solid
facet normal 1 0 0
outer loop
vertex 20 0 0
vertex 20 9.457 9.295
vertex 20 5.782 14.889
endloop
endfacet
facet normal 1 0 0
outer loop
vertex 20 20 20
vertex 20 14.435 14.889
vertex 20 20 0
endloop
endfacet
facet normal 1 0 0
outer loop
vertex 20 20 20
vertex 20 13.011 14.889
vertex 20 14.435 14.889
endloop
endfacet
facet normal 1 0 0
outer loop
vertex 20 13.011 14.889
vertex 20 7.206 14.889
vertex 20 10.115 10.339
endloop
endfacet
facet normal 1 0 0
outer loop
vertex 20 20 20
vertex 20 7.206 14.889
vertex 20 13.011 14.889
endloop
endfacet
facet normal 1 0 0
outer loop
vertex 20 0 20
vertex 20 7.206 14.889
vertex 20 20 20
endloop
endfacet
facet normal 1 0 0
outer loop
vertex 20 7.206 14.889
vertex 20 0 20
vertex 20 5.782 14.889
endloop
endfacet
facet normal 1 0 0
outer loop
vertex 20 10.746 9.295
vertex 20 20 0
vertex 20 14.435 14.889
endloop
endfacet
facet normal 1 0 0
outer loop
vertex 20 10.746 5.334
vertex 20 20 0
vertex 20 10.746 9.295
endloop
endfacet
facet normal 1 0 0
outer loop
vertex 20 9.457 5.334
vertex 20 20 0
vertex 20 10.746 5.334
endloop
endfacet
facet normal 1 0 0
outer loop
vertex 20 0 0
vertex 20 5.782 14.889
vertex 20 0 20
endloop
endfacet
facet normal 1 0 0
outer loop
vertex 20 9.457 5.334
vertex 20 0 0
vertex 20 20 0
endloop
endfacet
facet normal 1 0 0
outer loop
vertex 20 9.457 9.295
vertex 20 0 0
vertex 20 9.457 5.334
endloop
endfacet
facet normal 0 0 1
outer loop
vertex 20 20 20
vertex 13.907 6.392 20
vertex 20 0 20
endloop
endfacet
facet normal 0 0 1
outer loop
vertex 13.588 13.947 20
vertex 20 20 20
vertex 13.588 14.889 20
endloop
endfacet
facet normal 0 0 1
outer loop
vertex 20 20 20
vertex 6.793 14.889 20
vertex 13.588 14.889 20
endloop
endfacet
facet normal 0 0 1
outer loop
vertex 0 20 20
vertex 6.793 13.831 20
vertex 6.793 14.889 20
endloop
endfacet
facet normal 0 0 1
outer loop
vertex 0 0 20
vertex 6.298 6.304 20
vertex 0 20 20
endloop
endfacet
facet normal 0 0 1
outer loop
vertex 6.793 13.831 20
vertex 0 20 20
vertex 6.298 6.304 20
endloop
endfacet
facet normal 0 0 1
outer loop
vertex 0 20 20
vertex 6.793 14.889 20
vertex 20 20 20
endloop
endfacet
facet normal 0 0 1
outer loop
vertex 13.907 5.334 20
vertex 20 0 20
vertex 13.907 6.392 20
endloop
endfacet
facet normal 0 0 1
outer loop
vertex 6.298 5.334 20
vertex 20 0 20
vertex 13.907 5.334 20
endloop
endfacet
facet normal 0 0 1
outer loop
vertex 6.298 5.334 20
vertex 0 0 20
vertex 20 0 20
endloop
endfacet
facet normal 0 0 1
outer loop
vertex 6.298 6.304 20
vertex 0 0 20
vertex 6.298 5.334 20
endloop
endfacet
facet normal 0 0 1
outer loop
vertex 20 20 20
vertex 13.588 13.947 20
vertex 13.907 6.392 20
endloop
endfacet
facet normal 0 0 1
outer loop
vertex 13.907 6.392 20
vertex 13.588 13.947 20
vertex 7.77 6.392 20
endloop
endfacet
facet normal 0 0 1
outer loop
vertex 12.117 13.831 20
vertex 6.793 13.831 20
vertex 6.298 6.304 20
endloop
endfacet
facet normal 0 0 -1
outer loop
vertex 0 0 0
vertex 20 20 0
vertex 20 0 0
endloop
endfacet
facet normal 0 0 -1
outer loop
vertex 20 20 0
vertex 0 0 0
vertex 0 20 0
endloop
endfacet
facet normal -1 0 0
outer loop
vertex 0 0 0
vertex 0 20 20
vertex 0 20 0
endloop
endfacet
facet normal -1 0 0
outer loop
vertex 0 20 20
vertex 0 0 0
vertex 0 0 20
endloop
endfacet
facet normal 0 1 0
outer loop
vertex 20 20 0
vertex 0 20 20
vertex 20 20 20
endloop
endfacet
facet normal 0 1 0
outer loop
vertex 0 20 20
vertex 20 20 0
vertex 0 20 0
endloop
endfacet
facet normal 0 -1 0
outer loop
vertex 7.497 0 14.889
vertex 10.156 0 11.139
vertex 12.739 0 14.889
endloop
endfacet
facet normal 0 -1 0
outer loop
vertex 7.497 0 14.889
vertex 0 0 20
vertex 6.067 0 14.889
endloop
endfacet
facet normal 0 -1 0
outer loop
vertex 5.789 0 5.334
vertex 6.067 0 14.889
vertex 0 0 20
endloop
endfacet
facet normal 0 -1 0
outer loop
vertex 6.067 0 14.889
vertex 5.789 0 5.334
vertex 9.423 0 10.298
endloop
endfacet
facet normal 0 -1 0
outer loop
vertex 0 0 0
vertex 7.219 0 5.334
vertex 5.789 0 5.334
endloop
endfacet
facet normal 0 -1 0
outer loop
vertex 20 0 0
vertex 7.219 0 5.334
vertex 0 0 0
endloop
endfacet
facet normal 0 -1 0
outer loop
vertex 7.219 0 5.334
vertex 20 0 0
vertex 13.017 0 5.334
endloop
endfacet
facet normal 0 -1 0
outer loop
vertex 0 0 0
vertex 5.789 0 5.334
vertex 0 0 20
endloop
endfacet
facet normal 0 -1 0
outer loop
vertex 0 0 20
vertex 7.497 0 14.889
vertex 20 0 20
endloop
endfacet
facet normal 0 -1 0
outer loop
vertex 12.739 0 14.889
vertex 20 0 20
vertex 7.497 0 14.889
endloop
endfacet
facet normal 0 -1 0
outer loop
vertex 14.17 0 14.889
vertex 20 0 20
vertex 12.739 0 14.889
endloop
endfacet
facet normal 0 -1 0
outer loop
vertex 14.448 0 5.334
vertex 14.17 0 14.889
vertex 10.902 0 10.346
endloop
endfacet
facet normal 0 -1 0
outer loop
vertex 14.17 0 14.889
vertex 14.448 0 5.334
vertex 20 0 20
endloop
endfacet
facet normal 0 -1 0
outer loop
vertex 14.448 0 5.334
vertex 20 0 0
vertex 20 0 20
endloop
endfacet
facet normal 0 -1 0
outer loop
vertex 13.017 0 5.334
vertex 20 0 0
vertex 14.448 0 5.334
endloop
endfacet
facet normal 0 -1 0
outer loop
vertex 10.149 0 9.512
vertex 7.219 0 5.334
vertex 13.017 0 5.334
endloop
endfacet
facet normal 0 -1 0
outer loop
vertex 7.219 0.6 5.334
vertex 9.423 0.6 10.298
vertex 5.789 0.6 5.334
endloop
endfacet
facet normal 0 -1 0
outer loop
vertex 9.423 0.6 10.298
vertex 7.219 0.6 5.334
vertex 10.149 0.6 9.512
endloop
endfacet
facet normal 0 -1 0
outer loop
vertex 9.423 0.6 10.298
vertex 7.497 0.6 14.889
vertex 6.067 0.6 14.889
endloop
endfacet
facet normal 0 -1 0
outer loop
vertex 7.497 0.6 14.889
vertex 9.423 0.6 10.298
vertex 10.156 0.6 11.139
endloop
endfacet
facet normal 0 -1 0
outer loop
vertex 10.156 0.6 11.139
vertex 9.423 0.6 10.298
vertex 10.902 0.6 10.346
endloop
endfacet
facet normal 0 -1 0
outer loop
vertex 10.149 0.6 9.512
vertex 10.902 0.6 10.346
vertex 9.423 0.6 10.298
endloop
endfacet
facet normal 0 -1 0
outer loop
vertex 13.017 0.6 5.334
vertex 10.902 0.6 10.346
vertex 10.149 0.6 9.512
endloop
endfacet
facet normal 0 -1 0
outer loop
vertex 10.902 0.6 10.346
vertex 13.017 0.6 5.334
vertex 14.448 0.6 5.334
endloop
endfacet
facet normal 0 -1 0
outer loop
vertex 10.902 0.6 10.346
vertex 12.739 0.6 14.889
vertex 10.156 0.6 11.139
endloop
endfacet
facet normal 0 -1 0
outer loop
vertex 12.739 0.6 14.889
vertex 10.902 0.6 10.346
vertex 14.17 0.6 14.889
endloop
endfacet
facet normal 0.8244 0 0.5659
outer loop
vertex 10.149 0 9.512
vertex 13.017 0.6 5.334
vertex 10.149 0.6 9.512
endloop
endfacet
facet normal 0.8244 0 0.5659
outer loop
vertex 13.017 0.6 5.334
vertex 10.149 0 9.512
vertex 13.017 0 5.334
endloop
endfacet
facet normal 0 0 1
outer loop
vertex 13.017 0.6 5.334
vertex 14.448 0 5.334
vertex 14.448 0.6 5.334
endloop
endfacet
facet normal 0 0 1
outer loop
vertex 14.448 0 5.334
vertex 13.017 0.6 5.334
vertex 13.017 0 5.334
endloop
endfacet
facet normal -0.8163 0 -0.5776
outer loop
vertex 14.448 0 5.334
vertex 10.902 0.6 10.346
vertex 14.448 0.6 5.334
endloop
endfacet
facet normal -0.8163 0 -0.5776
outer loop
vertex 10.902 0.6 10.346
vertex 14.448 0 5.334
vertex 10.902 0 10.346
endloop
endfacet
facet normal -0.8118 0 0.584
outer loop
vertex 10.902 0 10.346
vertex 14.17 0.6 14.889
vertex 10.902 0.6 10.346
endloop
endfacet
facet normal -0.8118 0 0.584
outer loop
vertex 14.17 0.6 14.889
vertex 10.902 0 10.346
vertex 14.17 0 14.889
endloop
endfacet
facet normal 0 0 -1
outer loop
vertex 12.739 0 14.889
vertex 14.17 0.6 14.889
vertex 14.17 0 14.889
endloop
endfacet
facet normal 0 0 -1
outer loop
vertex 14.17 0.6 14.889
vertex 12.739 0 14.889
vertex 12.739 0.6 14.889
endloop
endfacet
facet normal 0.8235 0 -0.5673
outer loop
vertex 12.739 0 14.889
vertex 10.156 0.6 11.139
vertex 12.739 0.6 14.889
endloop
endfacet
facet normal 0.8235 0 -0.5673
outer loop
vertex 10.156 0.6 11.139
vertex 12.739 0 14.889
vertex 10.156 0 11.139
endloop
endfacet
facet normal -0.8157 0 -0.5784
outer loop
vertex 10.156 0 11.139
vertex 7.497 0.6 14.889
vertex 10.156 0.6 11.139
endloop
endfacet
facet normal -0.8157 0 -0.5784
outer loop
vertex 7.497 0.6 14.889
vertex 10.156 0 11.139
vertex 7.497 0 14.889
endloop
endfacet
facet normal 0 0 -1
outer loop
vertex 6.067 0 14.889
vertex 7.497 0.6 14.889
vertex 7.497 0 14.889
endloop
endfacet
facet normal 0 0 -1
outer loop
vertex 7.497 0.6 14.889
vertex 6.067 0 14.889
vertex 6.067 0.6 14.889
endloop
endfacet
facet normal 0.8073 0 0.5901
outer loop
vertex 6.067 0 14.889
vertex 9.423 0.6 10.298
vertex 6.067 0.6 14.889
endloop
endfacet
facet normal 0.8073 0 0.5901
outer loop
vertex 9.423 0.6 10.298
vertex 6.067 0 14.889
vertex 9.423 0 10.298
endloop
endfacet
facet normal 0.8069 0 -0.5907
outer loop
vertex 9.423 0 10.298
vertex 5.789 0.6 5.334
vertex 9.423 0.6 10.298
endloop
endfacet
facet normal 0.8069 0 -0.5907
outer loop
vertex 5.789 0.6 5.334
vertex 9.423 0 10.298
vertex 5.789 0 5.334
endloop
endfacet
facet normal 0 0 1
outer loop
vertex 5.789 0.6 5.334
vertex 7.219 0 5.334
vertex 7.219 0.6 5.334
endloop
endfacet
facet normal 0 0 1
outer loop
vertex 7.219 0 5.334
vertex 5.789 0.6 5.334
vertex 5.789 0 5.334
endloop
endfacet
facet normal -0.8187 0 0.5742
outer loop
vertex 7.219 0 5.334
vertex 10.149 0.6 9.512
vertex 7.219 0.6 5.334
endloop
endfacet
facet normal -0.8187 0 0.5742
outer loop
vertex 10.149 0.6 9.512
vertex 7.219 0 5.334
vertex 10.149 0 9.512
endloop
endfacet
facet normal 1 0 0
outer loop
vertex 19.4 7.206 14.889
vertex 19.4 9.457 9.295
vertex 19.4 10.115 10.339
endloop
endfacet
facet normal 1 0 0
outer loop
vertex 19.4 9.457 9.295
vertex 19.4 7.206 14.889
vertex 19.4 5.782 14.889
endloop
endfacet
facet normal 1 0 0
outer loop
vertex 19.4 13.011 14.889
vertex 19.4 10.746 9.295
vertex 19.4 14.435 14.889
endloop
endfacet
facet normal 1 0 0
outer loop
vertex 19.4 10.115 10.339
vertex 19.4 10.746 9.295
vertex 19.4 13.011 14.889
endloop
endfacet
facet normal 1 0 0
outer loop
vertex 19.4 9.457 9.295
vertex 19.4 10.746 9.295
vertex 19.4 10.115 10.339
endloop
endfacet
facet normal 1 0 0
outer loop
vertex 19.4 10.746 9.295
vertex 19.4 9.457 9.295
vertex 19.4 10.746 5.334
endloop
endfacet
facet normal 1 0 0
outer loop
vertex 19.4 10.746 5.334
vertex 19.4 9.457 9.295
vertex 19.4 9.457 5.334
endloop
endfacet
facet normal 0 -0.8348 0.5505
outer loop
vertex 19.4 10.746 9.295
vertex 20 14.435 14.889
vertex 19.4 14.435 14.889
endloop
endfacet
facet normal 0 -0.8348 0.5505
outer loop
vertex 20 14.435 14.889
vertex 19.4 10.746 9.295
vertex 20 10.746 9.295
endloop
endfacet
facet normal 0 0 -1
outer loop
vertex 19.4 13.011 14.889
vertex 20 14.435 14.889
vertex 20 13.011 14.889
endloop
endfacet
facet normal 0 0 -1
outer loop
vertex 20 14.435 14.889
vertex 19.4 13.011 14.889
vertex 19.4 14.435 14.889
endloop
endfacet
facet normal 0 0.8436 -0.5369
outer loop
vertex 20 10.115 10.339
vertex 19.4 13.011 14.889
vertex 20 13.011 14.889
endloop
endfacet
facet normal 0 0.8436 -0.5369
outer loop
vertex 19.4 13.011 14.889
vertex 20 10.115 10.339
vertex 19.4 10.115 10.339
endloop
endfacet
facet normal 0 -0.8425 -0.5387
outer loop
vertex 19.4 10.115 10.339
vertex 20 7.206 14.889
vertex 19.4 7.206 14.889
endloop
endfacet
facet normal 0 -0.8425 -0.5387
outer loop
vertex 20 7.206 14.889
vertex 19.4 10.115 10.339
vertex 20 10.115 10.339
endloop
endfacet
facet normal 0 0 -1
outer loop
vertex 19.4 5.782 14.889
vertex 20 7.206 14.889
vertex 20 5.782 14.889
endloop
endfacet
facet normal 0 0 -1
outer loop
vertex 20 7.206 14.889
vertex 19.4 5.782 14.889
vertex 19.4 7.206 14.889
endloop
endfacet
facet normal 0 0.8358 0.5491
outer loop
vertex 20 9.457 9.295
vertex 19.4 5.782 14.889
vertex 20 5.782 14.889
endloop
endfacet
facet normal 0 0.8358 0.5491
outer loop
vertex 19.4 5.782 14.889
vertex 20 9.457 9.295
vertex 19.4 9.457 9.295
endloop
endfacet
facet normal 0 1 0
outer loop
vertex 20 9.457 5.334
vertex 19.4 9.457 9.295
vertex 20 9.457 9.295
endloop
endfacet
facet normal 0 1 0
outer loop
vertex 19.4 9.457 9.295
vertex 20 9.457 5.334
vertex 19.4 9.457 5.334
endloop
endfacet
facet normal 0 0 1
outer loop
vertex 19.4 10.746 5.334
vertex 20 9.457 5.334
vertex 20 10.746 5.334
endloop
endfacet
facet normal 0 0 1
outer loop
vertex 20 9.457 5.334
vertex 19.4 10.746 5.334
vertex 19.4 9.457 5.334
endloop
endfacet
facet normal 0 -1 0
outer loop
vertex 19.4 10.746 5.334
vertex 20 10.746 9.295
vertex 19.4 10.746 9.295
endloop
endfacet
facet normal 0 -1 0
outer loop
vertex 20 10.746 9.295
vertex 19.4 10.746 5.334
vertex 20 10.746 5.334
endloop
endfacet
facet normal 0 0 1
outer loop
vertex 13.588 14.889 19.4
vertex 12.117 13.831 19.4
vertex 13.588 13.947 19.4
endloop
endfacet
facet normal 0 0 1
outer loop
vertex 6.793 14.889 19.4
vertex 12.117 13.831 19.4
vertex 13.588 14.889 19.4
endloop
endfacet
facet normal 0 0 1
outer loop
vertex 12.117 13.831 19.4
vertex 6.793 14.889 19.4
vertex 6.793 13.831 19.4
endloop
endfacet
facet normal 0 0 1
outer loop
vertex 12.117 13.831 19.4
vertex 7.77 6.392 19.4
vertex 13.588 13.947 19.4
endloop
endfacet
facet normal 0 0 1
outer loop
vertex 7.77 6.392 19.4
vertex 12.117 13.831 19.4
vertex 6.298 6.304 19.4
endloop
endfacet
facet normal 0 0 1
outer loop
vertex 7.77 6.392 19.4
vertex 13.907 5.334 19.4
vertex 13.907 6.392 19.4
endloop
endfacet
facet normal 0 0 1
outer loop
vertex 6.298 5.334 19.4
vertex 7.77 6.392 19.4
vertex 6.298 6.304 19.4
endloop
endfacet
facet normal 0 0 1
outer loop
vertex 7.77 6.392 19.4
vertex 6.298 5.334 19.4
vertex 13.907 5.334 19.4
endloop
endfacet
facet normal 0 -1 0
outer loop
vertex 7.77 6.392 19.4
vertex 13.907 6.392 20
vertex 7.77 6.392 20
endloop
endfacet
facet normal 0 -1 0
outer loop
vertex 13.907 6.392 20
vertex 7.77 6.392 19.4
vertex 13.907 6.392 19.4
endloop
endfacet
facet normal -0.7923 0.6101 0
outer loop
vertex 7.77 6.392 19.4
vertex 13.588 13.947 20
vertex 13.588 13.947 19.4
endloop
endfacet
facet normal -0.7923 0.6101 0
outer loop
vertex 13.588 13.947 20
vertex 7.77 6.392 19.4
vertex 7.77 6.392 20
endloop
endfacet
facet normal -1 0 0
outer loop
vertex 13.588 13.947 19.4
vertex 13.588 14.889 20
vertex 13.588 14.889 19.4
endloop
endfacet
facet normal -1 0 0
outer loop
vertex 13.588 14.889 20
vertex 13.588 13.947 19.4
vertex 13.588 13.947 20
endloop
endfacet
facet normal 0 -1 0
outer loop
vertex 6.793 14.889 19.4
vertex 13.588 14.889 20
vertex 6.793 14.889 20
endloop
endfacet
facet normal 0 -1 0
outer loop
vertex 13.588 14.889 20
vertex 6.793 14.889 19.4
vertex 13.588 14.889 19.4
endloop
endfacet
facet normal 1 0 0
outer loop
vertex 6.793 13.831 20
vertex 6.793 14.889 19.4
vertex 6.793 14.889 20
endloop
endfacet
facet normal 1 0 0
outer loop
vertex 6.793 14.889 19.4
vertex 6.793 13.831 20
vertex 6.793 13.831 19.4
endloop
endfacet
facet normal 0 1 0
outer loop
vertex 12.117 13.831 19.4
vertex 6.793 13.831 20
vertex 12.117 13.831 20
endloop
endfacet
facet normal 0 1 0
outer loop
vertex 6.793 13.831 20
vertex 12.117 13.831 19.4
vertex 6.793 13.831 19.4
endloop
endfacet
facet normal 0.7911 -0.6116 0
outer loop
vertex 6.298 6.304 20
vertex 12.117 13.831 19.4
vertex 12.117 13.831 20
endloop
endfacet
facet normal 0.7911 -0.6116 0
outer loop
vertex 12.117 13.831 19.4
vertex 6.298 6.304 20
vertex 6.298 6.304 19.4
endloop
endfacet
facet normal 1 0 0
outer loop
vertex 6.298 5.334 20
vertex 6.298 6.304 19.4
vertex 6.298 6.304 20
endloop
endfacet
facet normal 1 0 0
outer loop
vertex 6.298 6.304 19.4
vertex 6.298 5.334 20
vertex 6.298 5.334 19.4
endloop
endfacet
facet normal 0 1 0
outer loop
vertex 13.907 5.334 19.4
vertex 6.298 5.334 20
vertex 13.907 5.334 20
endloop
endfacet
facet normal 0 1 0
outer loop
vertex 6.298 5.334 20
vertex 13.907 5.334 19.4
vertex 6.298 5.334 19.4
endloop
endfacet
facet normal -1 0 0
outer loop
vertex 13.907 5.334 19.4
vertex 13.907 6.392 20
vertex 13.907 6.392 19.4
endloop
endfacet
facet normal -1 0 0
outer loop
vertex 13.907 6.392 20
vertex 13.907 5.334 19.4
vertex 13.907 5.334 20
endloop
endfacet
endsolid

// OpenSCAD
// ---------------------------------------------------------------
// calibration_cube.scad  -  XYZ calibration cube (default 20 mm)
// Used in: Level 1 exercises L1-2 and L1-7, Level 2 exercise L2-3
//
// Print it, measure each axis with calipers and compare with `size`.
// The engraved X / Y / Z letters tell you which face is which, and the
// letter edges make a handy sharpness check for corners and details.
// Units: millimeters.  No external libraries needed.
// ---------------------------------------------------------------

size       = 20;    // edge length of the cube
letter_h   = 10;    // letter height (text size in mm)
engrave    = 0.6;   // depth of the engraved letters
chamfer    = 0;     // optional 45 degree chamfer on the bottom edges (0 = off)
                    // a small chamfer (0.4-0.6) hides "elephant foot"
$fn        = 24;

module letter(t) {
    // extruded text, slightly deeper than `engrave` so the cut is clean
    linear_extrude(height = engrave + 0.01)
        text(t, size = letter_h, halign = "center", valign = "center");
}

module body() {
    if (chamfer > 0) {
        hull() {
            translate([chamfer, chamfer, 0]) cube([size - 2 * chamfer, size - 2 * chamfer, 0.01]);
            translate([0, 0, chamfer]) cube([size, size, size - chamfer]);
        }
    } else {
        cube(size);
    }
}

difference() {
    body();
    // X on the front face (y = 0), reads left-to-right when viewed from the front
    translate([size / 2, engrave, size / 2]) rotate([90, 0, 0]) letter("X");
    // Y on the right face (x = size)
    translate([size - engrave, size / 2, size / 2]) rotate([90, 0, 90]) letter("Y");
    // Z on the top face
    translate([size / 2, size / 2, size - engrave]) letter("Z");
}
